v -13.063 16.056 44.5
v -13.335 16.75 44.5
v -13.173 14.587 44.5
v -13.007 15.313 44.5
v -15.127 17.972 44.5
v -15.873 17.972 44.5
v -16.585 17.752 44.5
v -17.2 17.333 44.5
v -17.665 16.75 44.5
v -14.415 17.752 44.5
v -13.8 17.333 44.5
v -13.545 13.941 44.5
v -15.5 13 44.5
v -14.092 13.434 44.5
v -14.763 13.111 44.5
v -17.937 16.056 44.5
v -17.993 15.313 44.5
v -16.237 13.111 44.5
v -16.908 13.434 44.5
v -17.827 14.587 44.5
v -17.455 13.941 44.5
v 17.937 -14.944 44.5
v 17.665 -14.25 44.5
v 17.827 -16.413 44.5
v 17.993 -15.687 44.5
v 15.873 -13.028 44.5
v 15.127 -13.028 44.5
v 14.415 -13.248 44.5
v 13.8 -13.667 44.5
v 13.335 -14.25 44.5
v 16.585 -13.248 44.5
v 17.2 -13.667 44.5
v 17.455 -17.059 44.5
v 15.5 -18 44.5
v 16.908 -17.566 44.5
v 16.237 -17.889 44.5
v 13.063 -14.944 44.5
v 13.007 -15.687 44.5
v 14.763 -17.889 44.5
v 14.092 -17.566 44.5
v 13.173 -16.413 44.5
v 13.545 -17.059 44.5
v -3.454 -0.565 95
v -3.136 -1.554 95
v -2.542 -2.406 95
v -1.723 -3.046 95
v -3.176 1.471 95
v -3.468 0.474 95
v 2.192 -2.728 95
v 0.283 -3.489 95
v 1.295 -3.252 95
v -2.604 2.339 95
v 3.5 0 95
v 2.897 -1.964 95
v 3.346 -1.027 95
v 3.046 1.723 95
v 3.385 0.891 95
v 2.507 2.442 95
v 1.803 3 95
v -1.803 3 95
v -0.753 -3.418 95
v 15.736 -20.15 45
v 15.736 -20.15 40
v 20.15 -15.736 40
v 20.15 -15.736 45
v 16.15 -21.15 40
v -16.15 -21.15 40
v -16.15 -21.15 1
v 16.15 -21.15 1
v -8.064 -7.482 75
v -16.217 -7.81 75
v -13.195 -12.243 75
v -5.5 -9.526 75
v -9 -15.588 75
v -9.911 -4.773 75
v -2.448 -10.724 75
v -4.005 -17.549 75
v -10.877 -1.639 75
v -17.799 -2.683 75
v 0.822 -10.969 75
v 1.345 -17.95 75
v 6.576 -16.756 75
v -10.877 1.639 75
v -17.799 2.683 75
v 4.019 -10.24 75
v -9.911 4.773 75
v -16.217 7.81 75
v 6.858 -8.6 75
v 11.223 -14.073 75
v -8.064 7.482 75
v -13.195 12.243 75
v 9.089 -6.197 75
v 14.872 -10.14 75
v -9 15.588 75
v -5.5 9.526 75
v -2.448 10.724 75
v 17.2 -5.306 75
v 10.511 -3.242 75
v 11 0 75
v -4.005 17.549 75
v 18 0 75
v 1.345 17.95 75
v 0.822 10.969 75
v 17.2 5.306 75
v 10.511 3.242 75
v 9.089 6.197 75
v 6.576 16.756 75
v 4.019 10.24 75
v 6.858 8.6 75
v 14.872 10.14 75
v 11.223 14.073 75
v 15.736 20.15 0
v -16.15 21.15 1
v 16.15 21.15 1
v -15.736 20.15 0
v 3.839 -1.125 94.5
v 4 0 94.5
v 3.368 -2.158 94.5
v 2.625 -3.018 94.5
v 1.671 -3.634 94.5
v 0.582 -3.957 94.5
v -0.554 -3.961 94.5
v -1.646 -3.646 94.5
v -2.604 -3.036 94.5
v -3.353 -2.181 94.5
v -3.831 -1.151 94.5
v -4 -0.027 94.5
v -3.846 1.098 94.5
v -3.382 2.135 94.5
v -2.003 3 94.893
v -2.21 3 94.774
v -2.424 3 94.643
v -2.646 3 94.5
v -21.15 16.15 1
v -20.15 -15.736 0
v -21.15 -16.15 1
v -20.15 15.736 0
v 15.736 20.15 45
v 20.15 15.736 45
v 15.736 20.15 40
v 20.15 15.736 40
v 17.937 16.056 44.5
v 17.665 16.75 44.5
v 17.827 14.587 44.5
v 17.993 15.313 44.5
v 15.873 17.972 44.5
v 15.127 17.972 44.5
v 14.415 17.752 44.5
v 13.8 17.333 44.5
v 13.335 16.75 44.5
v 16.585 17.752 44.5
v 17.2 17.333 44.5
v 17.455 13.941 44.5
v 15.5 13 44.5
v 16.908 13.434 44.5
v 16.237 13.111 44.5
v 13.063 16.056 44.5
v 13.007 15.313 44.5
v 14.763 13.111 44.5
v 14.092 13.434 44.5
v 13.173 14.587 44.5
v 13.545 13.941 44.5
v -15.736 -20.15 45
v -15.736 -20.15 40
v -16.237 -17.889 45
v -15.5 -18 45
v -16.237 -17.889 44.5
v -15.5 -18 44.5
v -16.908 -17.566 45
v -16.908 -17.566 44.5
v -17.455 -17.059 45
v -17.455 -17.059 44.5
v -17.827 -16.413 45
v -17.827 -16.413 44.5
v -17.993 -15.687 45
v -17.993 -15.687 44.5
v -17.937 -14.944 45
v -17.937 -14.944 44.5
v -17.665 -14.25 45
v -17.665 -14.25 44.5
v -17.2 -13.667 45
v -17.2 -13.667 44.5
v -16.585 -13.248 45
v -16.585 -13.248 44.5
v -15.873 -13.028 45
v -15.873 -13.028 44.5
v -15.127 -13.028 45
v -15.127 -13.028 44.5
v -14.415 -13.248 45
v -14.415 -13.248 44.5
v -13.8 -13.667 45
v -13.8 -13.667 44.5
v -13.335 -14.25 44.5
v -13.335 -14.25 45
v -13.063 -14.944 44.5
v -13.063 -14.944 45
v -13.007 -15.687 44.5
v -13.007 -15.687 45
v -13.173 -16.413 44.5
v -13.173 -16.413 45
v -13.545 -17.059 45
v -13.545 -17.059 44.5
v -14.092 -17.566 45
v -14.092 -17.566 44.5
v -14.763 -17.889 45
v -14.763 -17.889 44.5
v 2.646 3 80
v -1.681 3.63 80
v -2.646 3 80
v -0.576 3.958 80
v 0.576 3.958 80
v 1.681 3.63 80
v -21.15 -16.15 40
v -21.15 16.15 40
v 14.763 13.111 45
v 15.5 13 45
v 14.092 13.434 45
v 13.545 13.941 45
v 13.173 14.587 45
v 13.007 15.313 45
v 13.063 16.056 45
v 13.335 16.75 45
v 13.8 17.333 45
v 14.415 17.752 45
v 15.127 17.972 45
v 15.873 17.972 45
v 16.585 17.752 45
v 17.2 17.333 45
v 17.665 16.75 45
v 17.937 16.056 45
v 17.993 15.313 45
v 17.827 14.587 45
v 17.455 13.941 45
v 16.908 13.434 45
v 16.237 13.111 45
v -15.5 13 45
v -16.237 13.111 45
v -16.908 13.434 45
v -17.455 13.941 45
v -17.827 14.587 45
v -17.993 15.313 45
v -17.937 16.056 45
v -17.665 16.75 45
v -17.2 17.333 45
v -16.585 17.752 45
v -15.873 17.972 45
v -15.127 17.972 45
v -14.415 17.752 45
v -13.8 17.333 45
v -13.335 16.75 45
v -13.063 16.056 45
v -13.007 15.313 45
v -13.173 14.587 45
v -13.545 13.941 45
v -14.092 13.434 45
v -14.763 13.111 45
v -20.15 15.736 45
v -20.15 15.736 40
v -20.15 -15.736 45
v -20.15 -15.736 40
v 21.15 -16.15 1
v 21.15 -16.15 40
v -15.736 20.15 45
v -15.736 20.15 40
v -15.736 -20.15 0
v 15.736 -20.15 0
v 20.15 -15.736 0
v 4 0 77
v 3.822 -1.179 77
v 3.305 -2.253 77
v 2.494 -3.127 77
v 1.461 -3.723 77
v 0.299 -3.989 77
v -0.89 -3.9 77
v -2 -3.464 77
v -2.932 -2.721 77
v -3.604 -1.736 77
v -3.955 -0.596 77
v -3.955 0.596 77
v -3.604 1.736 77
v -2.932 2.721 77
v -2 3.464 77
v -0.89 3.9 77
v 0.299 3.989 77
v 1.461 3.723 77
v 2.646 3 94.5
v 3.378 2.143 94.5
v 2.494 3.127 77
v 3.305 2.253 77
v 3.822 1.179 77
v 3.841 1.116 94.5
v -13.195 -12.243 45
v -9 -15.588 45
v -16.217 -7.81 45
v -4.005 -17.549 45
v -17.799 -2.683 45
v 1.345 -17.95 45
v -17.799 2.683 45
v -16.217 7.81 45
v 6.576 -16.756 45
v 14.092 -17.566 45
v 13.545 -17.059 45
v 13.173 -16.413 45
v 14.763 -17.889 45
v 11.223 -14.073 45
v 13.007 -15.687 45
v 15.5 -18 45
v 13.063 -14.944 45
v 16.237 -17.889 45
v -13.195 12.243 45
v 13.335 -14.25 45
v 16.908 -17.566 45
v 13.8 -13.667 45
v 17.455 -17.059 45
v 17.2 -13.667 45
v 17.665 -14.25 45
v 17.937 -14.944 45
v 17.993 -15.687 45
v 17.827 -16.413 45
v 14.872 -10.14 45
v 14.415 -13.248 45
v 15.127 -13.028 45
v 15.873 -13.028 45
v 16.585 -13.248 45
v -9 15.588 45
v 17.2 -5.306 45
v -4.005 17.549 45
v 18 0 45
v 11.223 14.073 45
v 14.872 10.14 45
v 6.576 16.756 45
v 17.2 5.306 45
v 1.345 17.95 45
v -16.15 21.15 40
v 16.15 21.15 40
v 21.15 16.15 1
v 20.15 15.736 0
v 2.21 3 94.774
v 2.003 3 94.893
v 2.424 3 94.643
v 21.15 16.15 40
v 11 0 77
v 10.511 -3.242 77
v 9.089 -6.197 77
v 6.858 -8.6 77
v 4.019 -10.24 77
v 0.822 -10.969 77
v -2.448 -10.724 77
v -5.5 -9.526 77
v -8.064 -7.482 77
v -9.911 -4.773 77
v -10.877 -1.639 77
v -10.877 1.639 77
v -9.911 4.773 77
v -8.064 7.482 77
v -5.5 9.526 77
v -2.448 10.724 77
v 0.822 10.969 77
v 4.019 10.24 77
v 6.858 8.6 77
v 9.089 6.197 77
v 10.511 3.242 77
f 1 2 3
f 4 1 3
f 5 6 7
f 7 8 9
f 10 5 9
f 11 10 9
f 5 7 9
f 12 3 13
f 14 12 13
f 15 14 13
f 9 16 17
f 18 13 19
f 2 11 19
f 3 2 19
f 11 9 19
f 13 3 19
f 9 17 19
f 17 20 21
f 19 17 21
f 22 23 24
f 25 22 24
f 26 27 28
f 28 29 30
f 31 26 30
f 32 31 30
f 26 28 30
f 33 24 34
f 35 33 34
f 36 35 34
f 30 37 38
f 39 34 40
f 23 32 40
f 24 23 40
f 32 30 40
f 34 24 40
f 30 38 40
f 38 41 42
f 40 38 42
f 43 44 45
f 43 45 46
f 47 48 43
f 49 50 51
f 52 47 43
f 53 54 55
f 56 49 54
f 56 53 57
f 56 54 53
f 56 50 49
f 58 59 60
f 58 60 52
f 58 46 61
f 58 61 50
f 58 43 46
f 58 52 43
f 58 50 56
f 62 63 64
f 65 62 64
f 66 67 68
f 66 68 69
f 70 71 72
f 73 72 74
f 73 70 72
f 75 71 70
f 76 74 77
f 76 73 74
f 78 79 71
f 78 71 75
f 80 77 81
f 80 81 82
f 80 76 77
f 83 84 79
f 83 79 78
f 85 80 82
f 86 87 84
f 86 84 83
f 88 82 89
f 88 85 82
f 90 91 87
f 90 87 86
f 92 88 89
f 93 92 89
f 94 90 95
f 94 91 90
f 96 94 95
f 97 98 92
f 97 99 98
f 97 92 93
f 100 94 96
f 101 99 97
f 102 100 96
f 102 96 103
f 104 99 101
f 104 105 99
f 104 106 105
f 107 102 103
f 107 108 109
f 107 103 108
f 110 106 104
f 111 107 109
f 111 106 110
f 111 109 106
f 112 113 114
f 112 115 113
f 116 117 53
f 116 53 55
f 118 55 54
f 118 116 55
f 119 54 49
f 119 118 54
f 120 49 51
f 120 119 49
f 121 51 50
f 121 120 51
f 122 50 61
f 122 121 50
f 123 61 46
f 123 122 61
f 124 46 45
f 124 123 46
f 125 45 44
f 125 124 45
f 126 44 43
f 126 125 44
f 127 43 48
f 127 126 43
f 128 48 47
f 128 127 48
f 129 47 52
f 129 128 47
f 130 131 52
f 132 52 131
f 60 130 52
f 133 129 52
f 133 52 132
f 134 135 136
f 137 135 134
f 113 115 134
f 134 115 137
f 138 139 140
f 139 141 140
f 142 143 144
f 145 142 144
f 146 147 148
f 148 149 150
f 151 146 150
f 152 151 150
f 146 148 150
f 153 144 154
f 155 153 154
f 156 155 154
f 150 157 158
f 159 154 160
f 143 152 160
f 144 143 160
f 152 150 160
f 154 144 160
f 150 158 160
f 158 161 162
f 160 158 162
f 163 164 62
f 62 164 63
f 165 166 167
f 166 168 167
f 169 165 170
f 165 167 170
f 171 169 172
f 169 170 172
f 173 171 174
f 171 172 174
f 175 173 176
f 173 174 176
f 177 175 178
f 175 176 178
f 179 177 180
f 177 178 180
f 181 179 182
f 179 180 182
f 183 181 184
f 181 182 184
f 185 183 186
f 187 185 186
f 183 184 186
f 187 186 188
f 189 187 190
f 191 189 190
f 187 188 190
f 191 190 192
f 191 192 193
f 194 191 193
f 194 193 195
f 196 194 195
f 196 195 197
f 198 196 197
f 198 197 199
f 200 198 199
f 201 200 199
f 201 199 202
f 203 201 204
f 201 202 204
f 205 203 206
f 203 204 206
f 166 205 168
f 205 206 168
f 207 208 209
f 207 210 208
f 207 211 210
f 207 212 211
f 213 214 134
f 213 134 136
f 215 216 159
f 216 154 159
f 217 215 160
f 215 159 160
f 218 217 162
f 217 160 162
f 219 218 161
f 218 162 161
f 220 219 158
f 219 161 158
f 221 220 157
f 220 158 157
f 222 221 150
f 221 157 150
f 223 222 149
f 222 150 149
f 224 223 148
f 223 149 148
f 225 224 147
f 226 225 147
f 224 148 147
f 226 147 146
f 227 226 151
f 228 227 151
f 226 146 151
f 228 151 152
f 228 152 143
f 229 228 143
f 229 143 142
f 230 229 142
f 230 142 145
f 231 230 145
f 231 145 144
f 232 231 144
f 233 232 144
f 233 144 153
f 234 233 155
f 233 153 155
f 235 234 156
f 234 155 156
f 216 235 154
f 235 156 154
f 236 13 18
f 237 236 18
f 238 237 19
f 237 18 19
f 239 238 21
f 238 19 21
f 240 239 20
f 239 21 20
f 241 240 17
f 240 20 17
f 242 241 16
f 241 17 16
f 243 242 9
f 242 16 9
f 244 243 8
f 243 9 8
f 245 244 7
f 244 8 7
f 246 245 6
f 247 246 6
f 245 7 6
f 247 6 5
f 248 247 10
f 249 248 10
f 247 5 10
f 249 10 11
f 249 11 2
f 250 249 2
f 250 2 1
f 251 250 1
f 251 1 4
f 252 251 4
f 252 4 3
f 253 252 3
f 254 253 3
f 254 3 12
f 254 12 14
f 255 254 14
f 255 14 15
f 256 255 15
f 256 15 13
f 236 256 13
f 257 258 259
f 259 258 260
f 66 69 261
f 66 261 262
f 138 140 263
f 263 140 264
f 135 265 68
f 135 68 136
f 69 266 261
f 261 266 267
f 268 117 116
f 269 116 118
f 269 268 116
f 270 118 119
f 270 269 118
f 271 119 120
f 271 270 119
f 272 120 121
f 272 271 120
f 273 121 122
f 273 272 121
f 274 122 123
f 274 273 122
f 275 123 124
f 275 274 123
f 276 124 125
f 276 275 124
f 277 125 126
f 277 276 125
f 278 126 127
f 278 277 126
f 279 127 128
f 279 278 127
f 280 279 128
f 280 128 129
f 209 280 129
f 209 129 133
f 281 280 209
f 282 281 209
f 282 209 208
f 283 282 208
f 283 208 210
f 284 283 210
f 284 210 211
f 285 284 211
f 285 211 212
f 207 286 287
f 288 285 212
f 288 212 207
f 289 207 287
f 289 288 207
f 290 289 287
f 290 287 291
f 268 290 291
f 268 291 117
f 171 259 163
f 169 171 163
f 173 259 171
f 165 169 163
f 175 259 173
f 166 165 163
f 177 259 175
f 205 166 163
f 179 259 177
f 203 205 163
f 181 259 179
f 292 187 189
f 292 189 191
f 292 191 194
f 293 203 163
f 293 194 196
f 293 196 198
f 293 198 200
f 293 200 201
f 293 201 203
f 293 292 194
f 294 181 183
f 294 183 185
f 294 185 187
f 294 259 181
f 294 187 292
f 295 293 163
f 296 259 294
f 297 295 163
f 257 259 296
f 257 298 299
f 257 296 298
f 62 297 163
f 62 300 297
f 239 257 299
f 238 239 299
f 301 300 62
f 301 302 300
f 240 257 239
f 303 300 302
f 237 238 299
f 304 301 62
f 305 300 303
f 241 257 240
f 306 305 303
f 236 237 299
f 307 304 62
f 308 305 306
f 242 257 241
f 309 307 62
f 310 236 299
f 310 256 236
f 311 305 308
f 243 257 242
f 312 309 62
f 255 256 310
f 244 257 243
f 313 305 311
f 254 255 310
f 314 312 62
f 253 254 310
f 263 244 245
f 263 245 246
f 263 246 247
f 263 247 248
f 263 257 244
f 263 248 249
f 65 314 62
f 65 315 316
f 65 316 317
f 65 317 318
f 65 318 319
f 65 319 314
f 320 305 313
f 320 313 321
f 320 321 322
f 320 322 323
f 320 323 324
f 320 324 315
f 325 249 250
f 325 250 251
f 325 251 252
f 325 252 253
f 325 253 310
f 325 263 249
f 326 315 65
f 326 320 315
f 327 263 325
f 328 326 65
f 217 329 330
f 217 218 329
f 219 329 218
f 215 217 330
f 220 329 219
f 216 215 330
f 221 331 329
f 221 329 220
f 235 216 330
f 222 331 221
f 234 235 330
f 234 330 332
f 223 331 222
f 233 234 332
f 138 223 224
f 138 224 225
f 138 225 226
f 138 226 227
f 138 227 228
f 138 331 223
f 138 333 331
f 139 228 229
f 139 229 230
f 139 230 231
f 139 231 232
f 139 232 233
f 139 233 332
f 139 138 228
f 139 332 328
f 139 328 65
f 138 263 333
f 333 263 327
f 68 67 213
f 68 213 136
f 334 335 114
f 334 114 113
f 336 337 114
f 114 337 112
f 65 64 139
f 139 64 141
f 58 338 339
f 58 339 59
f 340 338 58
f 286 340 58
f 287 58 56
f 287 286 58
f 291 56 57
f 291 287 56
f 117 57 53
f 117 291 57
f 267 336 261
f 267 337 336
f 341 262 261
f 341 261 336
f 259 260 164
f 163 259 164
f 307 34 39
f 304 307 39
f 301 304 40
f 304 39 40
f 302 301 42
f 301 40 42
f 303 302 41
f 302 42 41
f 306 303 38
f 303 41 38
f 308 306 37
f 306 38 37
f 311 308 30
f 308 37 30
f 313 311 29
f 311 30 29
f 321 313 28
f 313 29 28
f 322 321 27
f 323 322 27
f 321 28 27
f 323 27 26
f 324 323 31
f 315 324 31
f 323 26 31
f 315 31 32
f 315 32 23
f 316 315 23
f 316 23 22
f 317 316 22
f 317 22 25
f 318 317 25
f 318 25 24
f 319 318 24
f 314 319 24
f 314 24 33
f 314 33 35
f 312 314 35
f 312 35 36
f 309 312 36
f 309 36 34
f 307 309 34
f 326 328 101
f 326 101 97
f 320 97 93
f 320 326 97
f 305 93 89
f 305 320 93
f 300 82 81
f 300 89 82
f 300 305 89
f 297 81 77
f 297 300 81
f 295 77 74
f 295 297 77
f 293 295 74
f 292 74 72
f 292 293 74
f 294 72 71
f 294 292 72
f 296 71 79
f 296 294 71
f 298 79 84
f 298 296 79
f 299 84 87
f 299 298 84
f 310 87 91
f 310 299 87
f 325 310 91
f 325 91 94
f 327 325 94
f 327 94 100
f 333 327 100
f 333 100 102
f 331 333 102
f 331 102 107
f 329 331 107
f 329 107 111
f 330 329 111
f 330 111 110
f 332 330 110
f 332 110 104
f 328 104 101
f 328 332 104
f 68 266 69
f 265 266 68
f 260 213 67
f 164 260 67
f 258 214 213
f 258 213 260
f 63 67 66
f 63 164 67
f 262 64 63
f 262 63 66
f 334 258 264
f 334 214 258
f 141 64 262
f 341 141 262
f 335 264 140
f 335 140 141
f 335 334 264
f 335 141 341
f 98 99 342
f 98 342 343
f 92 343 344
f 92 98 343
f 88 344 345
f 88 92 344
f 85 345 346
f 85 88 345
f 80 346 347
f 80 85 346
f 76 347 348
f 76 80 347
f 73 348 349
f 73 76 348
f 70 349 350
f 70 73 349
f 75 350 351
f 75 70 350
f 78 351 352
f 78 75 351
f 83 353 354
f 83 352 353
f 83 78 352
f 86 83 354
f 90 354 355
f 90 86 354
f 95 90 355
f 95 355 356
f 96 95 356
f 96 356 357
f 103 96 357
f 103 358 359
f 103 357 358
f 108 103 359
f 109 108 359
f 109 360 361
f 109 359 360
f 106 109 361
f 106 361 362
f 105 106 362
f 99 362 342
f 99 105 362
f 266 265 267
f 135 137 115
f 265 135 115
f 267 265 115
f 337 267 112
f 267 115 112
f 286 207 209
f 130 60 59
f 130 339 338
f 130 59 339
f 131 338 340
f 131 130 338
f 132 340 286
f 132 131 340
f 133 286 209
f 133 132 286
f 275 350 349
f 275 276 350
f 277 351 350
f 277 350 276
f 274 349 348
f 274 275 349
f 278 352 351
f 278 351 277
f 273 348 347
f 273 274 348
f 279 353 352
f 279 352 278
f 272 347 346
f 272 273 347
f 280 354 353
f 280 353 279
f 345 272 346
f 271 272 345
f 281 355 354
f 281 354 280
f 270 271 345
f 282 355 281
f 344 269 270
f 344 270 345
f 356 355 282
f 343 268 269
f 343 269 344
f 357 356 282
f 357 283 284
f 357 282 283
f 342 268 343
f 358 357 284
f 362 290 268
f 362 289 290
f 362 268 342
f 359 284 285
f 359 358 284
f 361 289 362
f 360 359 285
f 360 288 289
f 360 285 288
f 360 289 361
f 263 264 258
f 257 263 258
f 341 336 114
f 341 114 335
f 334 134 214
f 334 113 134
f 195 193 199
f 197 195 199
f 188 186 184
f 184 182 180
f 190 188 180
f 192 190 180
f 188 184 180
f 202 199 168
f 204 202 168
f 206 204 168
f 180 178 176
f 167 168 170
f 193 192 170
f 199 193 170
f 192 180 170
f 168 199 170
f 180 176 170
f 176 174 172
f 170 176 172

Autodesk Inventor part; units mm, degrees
ref_plane "YZ Plane" through (0, 0, 0) normal (1, 0, 0) x (0, 1, 0)
ref_plane "XZ Plane" through (0, 0, 0) normal (0, 1, 0) x (-1, 0, 0)
ref_plane "XY Plane" through (0, 0, 0) normal (0, 0, 1) x (1, 0, 0)
sketch "Sketch1" plane through (0, 0, 0) normal (0, 0, 1) x (1, 0, 0)
  line L0 (-21.15, -21.15) -> (21.15, -21.15)
  line L1 (21.15, -21.15) -> (21.15, 21.15)
  line L2 (21.15, 21.15) -> (-21.15, 21.15)
  line L3 (-21.15, 21.15) -> (-21.15, -21.15)
  line L4 (-21.15, -21.15) -> (21.15, 21.15) construction
  line L5 (21.15, -21.15) -> (-21.15, 21.15) construction
  point P0 (0, 0)
  dimension "d0" = 42.3
  dimension "d1" = 42.3
extrude "Extrusion1" add sketch "Sketch1" along normal blind 40
chamfer "Chamfer1" distance 5 angle 45 4 edges at (21.15, -21.15, 20) (-21.15, -21.15, 20) (21.15, 21.15, 20) (-21.15, 21.15, 20)
sketch "Sketch2" plane through (0, 0, 40) normal (0, 0, 1) x (1, 0, 0)
  circle A0 centre (0, 0) radius 18
  dimension "d7" = 36
extrude "Extrusion2" add sketch "Sketch2" along normal blind 35
sketch "Sketch3" plane through (0, 0, 40) normal (0, 0, 1) x (1, 0, 0)
  circle A0 centre (0, 0) radius 18 projected
  line L0 (-21.15, 16.15) -> (-16.15, 21.15) projected
  line L1 (-21.15, 16.15) -> (-21.15, -16.15) projected
  line L2 (-16.15, -21.15) -> (-21.15, -16.15) projected
  line L3 (-16.15, -21.15) -> (16.15, -21.15) projected
  line L4 (21.15, -16.15) -> (16.15, -21.15) projected
  line L5 (21.15, -16.15) -> (21.15, 16.15) projected
  line L6 (16.15, 21.15) -> (21.15, 16.15) projected
  line L7 (16.15, 21.15) -> (-16.15, 21.15) projected
  line L8 (-15.7358, 20.15) -> (-20.15, 15.7358)
  line L9 (-20.15, 15.7358) -> (-20.15, -15.7358)
  line L10 (-20.15, -15.7358) -> (-15.7358, -20.15)
  line L11 (-15.7358, -20.15) -> (15.7358, -20.15)
  line L12 (15.7358, -20.15) -> (20.15, -15.7358)
  line L13 (20.15, -15.7358) -> (20.15, 15.7358)
  line L14 (20.15, 15.7358) -> (15.7358, 20.15)
  line L15 (15.7358, 20.15) -> (-15.7358, 20.15)
  dimension "d10" = 1
extrude "Extrusion3" add sketch "Sketch3" along normal blind 5 contours L15 L14 L13 L12 L11 L10 L9 L8
sketch "Sketch4" plane through (0, 0, 45) normal (0, 0, 1) x (1, 0, 0)
  line L0 (-15.5, -15.5) -> (15.5, -15.5) construction
  line L1 (15.5, -15.5) -> (15.5, 15.5) construction
  line L2 (15.5, 15.5) -> (-15.5, 15.5) construction
  line L3 (-15.5, 15.5) -> (-15.5, -15.5) construction
  line L4 (-15.5, -15.5) -> (15.5, 15.5) construction
  line L5 (15.5, -15.5) -> (-15.5, 15.5) construction
  point P0 (0, 0)
  dimension "d13" = 31
  dimension "d14" = 31
hole "Hole1" at (-15.5, 15.5, 45) at (15.5, 15.5, 45) at (-15.5, -15.5, 45) at (15.5, -15.5, 45) direction (0, 0, -1) diameter 5 depth 0.5
sketch "Sketch5" plane through (0, 0, 75) normal (0, 0, 1) x (1, 0, 0)
  circle A0 centre (0, 0) radius 11
  dimension "d22" = 22
extrude "Extrusion4" add sketch "Sketch5" along normal blind 2
sketch "Sketch6" plane through (0, 0, 77) normal (0, 0, 1) x (1, 0, 0)
  circle A0 centre (0, 0) radius 4
  dimension "d25" = 8
extrude "Extrusion5" add sketch "Sketch6" along normal blind 18
sketch "Sketch7" plane through (0, 0, 95) normal (0, 0, 1) x (1, 0, 0)
  line L0 (-2.6458, 4) -> (2.6458, 4)
  line L1 (2.6458, 4) -> (2.6458, 3)
  line L2 (2.6458, 3) -> (-2.6458, 3)
  line L3 (-2.6458, 3) -> (-2.6458, 4)
  circle A0 centre (0, 0) radius 4 projected
  line L4 (0, 0) -> (0, 4)
  circle A1 centre (0, 0) radius 4 projected
  point P0 (0, 3)
  dimension "d28" = 7
extrude "Extrusion6" cut sketch "Sketch7" against normal blind 15 contours L0 A0 L3 | L0 L1 A0 | L4 L2 A0 | A0 L2 L4
chamfer "Chamfer2" distance 0.5 angle 45 2 edges at (3.6458, 1.6458, 95) (-1.6458, -3.6458, 95)
chamfer "Chamfer3" distance 1 angle 45 8 edges at (0, 21.15, 0) (18.65, 18.65, 0) (21.15, 0, 0) (-21.15, 0, 0) (-18.65, 18.65, 0) (18.65, -18.65, 0) (0, -21.15, 0) (-18.65, -18.65, 0)
properties part number "motor con reductora"
